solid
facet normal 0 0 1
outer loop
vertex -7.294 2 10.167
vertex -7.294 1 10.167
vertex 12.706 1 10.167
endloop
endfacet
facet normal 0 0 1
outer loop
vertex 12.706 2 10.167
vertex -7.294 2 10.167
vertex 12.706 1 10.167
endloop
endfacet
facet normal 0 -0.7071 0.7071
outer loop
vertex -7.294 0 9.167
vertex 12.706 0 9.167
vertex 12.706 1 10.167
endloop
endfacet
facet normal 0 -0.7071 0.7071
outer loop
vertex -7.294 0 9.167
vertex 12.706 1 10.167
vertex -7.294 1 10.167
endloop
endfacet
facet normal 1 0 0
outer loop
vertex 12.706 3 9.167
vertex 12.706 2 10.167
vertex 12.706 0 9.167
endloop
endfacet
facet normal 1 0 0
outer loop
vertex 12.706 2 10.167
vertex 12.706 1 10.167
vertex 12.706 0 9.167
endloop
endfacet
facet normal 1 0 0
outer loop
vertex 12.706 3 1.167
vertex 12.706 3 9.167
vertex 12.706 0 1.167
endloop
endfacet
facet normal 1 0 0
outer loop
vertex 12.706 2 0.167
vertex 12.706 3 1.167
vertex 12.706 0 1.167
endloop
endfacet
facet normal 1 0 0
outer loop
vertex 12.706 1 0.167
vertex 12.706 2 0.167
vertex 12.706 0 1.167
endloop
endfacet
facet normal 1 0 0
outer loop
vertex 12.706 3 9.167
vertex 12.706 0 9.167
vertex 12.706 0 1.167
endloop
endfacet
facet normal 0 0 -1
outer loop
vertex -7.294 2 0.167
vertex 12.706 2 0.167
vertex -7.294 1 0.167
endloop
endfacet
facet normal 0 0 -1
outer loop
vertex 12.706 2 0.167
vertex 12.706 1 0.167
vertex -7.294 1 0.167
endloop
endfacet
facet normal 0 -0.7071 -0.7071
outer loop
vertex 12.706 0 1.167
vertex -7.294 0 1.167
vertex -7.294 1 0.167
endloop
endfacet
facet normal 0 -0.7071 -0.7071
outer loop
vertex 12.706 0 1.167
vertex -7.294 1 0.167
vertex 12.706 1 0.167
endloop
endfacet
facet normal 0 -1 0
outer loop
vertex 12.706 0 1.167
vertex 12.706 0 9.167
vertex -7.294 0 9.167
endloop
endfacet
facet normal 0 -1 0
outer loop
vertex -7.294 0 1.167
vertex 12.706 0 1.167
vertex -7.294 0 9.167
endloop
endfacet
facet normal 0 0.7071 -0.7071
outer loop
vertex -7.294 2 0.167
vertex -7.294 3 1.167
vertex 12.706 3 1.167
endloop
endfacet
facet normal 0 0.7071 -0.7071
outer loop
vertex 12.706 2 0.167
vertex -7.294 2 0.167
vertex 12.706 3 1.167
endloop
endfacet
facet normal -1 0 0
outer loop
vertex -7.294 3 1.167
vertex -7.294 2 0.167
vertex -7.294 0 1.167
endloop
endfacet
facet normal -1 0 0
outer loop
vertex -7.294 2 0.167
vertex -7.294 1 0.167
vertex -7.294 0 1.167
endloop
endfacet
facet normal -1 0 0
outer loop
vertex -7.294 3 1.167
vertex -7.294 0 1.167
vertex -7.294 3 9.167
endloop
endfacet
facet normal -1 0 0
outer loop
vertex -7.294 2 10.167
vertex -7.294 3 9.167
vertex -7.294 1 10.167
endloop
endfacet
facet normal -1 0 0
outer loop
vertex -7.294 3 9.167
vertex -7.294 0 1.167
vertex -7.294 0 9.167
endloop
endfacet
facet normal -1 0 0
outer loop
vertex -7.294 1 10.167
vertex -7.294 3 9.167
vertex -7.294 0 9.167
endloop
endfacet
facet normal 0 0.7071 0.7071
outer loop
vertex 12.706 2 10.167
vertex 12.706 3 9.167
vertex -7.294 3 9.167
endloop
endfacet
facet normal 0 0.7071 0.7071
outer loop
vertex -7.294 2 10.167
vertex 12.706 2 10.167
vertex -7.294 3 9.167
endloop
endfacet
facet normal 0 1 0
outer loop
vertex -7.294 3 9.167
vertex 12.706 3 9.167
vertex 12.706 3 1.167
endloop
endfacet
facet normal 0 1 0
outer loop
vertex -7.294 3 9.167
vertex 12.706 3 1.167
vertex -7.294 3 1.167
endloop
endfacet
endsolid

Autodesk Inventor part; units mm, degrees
ref_plane "YZ Plane" through (0, 0, 0) normal (1, 0, 0) x (0, 1, 0)
ref_plane "XZ Plane" through (0, 0, 0) normal (0, 1, 0) x (-1, 0, 0)
ref_plane "XY Plane" through (0, 0, 0) normal (0, 0, 1) x (1, 0, 0)
sketch "Sketch1" plane through (0, 0, 0) normal (0, 1, 0) x (-1, 0, 0)
  line L0 (7.294, 10.1667) -> (-12.706, 10.1667)
  line L1 (-12.706, 10.1667) -> (-12.706, 0.1667)
  line L2 (-12.706, 0.1667) -> (7.294, 0.1667)
  line L3 (7.294, 0.1667) -> (7.294, 10.1667)
  point P0 (0, 0)
  dimension "d0" = 20
  dimension "d1" = 10
extrude "Extrusion1" add sketch "Sketch1" along normal blind 3
chamfer "Chamfer1" distance 1 angle 45 4 edges at (2.706, 3, 10.1667) (2.706, 0, 10.1667) (2.706, 0, 0.1667) (2.706, 3, 0.1667)
properties part number "lipol-40mAh"
